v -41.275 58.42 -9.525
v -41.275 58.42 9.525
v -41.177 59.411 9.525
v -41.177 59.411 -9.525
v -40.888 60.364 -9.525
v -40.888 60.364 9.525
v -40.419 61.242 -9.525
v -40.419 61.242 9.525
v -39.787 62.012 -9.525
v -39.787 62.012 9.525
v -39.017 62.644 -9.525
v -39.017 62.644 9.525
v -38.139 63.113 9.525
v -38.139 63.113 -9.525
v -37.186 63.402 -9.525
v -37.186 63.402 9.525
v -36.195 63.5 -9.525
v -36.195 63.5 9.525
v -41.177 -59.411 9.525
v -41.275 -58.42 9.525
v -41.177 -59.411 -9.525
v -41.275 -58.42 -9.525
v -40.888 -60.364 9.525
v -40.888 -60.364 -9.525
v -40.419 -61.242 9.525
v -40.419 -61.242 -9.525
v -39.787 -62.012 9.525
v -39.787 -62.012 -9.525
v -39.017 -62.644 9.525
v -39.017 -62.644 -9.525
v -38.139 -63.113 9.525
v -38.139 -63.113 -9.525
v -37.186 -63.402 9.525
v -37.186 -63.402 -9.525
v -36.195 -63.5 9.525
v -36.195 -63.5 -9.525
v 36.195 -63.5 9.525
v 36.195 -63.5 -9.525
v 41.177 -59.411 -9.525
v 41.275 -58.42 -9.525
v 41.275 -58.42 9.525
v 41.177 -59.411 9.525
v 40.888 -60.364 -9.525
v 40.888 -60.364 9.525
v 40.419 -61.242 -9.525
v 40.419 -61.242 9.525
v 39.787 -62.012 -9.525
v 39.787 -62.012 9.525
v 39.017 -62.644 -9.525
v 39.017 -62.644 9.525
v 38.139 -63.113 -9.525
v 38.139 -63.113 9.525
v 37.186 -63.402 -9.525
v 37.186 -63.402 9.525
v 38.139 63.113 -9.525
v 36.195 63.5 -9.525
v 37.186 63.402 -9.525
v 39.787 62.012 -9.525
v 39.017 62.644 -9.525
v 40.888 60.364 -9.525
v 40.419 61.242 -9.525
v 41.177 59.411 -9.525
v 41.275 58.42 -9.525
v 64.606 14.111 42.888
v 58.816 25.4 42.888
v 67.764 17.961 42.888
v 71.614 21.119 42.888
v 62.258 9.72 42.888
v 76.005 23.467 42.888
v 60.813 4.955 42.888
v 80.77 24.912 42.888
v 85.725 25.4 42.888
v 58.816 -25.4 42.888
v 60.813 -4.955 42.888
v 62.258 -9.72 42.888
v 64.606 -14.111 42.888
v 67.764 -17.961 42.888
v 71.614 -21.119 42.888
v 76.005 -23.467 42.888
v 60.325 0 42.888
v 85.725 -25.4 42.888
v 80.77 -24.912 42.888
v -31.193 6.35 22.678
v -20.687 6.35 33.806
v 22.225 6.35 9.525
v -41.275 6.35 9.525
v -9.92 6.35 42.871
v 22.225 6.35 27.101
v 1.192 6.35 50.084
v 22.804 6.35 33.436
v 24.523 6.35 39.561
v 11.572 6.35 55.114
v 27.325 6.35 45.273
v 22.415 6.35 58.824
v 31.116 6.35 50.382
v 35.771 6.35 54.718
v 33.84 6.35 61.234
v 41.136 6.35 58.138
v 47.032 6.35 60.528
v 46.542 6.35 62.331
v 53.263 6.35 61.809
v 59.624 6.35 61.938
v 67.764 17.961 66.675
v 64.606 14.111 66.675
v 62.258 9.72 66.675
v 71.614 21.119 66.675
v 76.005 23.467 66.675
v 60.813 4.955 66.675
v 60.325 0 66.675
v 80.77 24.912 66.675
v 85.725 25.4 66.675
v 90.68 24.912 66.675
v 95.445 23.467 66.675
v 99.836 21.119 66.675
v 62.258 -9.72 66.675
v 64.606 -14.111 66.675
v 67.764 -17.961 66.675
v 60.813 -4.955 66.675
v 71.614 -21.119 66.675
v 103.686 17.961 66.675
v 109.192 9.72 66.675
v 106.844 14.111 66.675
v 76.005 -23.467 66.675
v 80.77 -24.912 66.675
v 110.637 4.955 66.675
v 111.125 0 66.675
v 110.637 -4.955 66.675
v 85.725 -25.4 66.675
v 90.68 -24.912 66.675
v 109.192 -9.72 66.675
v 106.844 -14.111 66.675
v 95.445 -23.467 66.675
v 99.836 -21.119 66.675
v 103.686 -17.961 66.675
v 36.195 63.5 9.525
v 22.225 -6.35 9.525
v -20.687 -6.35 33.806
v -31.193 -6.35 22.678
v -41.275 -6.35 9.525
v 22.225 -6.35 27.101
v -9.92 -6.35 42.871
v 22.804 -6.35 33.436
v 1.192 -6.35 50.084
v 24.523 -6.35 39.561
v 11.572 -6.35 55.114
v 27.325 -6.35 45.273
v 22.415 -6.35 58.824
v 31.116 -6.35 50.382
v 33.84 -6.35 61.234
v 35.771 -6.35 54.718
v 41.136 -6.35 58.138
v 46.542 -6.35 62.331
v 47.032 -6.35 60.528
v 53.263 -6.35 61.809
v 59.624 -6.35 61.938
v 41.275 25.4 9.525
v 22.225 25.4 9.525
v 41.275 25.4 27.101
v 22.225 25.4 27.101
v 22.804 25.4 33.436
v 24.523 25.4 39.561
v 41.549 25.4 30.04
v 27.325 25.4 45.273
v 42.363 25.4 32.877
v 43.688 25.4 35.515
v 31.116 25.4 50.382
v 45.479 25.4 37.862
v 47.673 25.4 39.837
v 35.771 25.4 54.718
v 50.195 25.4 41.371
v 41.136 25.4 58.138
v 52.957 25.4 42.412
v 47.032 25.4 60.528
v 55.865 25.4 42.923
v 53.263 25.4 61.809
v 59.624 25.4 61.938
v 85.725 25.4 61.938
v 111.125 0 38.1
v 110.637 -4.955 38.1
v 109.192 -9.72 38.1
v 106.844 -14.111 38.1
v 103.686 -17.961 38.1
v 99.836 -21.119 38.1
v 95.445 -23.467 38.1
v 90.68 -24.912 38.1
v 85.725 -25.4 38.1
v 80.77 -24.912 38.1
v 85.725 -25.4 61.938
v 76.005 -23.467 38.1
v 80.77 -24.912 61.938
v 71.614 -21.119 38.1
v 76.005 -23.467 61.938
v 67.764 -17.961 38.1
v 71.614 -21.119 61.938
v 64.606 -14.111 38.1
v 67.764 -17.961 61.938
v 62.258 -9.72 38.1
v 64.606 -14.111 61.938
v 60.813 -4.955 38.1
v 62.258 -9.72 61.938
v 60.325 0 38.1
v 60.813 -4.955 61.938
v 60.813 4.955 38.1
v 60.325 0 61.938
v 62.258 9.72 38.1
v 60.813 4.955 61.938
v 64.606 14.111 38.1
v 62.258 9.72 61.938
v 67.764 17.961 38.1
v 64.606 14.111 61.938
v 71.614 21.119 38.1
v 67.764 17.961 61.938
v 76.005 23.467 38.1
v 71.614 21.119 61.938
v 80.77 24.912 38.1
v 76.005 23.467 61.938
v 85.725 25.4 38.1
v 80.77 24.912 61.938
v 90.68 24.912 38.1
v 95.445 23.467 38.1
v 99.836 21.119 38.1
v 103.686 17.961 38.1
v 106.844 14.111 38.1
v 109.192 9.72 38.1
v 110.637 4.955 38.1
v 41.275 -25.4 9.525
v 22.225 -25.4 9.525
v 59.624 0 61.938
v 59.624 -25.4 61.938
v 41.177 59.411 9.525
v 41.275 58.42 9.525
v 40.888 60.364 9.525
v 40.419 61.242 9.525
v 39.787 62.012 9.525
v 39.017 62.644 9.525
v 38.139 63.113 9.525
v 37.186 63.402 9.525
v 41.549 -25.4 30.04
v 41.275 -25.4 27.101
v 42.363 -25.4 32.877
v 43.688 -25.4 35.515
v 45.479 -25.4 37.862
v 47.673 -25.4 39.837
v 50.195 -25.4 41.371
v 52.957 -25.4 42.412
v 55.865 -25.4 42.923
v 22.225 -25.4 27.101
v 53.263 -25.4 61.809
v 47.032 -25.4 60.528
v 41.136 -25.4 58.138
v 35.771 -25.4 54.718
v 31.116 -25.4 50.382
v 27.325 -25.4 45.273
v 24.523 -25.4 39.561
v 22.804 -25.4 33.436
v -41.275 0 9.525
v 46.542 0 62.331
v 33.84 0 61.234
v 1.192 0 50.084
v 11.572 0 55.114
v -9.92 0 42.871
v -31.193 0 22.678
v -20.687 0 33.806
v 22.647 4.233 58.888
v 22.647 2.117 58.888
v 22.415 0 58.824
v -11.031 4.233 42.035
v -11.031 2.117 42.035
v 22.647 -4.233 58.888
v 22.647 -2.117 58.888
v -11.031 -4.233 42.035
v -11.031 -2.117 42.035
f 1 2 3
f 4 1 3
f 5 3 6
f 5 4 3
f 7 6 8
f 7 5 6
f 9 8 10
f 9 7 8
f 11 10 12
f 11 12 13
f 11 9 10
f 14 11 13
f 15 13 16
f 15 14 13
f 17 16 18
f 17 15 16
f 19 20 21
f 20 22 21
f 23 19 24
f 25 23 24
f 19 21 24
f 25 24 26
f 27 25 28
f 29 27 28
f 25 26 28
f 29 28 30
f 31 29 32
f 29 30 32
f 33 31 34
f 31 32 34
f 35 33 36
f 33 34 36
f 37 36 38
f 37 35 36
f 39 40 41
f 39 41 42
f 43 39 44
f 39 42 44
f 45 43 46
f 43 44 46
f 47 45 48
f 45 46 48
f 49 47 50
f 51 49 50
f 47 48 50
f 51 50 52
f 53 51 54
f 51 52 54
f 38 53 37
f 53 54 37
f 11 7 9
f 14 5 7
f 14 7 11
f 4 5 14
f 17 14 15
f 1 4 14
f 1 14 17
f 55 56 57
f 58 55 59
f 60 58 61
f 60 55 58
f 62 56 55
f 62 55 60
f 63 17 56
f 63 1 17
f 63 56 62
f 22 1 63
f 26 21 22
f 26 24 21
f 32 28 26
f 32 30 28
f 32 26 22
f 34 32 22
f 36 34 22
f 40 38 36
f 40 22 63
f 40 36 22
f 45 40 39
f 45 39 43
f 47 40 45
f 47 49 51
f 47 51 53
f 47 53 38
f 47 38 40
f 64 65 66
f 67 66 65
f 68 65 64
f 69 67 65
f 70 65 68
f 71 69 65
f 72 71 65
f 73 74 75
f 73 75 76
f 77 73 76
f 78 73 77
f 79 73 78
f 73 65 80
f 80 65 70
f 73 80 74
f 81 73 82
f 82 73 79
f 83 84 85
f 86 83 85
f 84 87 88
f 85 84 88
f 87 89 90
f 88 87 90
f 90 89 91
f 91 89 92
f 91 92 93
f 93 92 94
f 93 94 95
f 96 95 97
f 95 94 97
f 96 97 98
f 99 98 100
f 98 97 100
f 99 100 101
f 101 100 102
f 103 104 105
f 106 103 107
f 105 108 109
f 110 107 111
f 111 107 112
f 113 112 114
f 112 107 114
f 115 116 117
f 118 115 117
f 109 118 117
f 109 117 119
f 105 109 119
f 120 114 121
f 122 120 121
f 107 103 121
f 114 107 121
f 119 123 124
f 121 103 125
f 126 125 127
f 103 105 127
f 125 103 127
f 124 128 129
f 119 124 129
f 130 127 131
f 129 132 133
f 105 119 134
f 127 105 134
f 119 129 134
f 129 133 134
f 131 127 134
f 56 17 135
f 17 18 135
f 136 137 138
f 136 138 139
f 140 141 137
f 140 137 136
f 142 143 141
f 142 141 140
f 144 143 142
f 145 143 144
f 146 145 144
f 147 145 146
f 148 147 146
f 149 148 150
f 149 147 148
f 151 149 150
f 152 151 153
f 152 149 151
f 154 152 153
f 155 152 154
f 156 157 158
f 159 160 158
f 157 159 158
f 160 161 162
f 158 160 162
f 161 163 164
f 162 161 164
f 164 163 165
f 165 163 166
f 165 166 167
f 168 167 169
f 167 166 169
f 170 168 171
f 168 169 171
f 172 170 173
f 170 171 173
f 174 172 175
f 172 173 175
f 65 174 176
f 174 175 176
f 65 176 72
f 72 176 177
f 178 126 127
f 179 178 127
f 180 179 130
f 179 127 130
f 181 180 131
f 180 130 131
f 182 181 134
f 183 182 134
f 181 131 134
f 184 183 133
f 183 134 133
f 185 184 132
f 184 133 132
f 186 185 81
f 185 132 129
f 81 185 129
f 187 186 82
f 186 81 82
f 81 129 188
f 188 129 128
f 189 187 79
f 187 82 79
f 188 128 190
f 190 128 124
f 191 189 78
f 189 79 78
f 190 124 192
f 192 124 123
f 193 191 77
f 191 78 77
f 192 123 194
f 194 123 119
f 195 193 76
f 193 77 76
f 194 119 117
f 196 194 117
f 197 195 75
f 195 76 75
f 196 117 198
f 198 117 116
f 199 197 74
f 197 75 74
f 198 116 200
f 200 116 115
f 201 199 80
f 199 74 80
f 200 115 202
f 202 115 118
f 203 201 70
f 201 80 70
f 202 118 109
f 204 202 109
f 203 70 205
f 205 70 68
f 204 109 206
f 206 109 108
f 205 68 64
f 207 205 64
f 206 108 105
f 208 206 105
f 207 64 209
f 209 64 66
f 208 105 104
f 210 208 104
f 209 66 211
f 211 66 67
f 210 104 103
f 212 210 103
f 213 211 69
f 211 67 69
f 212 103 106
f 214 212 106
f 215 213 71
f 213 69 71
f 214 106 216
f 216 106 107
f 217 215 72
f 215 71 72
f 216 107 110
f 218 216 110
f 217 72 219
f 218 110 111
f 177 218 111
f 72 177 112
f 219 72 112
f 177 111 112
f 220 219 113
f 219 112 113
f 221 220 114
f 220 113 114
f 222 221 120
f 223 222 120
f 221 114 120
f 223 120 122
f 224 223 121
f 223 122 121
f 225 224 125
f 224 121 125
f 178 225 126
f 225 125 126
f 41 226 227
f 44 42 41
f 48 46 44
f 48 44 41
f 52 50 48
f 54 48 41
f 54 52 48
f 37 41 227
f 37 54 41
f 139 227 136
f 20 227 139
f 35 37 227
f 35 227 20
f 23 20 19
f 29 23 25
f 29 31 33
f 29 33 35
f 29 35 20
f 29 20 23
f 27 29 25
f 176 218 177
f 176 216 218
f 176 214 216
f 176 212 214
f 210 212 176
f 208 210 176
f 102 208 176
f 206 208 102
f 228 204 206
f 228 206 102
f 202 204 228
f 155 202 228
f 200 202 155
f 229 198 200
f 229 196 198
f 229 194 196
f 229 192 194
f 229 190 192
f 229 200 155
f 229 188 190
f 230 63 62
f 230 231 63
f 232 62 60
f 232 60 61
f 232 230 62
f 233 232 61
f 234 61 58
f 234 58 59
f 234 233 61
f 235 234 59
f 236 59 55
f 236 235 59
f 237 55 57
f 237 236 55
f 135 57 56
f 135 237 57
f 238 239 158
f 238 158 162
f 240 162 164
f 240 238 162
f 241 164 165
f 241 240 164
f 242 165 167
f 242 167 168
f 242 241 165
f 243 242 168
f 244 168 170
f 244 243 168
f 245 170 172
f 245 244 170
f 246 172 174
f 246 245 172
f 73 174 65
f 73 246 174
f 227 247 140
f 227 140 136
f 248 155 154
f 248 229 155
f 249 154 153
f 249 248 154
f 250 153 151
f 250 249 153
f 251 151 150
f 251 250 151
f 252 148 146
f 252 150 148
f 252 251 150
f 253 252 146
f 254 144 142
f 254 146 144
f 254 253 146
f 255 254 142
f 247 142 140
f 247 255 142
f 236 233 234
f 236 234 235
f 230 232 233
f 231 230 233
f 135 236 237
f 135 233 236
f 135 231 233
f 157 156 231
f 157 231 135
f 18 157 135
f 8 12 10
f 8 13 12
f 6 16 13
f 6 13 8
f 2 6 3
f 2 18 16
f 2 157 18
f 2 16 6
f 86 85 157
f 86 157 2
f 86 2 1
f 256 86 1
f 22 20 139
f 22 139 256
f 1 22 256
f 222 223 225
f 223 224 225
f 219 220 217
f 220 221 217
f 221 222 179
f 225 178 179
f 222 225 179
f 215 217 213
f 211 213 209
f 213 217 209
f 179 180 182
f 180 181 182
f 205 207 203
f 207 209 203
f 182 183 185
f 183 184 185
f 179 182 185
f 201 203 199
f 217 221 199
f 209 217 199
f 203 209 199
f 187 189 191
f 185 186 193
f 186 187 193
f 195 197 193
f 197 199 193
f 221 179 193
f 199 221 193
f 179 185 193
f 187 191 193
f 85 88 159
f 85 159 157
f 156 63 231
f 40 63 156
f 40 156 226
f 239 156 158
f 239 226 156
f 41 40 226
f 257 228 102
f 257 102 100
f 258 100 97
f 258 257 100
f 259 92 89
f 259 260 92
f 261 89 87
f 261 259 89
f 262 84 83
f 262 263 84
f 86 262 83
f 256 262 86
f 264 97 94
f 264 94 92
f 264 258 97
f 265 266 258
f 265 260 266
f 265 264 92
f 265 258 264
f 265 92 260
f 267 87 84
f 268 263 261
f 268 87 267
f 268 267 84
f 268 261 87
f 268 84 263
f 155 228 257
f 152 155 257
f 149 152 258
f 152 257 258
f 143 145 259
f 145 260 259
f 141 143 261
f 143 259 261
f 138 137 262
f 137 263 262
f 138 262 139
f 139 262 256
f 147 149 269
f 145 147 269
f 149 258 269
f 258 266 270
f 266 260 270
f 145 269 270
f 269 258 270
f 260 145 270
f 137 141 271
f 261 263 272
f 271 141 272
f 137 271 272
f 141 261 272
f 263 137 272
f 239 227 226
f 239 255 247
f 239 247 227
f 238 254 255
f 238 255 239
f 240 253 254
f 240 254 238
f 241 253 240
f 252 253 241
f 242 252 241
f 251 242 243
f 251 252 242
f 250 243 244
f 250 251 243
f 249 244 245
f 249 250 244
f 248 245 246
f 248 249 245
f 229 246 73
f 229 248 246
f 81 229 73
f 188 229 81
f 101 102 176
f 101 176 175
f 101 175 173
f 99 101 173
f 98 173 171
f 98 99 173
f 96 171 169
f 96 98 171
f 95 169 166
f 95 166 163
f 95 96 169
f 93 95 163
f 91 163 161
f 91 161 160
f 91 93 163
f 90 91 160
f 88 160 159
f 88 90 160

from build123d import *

# Parameters (mm, degrees)
F1_DEPTH = 63.5
F0_W     = 25.4
F0_H     = 19.05
F2_DEPTH = 25.4
F3_DEPTH = 6.35
F5_R     = 5.08


# Not quite as in the source:
# - a length typed as a fraction of an inch, garbled in the dataset ("3 / 203.2 mm" for 3/8 in), is restored


with BuildPart() as f1:
    # F0 (on Front) → F1 (new body, symmetric)
    with BuildSketch(Plane.XZ):
        Polygon((-41.275, -9.525), (41.275, -9.525), (41.275, 9.525), (22.225, 9.525), (-41.275, 9.525), align=None)
    extrude(amount=F1_DEPTH, both=True)

    # F0 (on Front) → F2 (join, symmetric)
    with BuildSketch(Plane.XZ):
        with BuildLine():
            Line((22.225, 9.525), (41.275, 9.525))
            Line((41.275, 9.525), (41.275, 27.1006073004))
            ThreePointArc((41.275, 27.1006073004), (46.5301853034, 38.9004022482), (58.8164375824, 42.8879))
            Line((58.8164375824, 42.8879), (60.325, 42.8879))
            Line((60.325, 42.8879), (60.325, 61.9379))
            Line((60.325, 61.9379), (59.6235930061, 61.9379))
            ThreePointArc((59.6235930061, 61.9379), (33.3449019193, 52.6558989318), (22.225, 27.1006073004))
            Line((22.225, 27.1006073004), (22.225, 9.525))
        make_face()
        with Locations((73.025, 52.4129)):
            Rectangle(F0_W, F0_H)
    extrude(amount=F2_DEPTH, both=True)

    # F0 (on Front) → F3 (join, symmetric)
    with BuildSketch(Plane.XZ):
        with BuildLine():
            add(Edge.make_bspline(
                [(59.6235930061, 61.9379), (21.0421923548, 65.1707053185), (-12.7928890288, 50.4826121032), (-41.275, 9.525)],
                knots=[0, 0, 0, 0, 113.6997720183, 113.6997720183, 113.6997720183, 113.6997720183], degree=3))
            Line((-41.275, 9.525), (22.225, 9.525))
            Line((22.225, 9.525), (22.225, 27.1006073004))
            ThreePointArc((22.225, 27.1006073004), (33.3449019193, 52.6558989318), (59.6235930061, 61.9379))
        make_face()
    extrude(amount=F3_DEPTH, both=True)

    # F0 (on Front) → F4 (revolve)
    with BuildSketch(Plane.XZ):
        Polygon((85.725, 66.675), (85.725, 61.9379), (85.725, 42.8879), (85.725, 38.1), (111.125, 38.1), (111.125, 66.675), align=None)
    revolve(axis=Axis((85.725, 0, 52.3875), (0, 0, -1)))

    # F5
    f5_edges = [f1.edges().sort_by_distance(p)[0] for p in [
        (41.275, -63.5, 0),
        (-41.275, -63.5, 0),
        (41.275, 63.5, 0),
        (-41.275, 63.5, 0),
    ]]
    fillet(f5_edges, radius=F5_R)


solid = f1.part
